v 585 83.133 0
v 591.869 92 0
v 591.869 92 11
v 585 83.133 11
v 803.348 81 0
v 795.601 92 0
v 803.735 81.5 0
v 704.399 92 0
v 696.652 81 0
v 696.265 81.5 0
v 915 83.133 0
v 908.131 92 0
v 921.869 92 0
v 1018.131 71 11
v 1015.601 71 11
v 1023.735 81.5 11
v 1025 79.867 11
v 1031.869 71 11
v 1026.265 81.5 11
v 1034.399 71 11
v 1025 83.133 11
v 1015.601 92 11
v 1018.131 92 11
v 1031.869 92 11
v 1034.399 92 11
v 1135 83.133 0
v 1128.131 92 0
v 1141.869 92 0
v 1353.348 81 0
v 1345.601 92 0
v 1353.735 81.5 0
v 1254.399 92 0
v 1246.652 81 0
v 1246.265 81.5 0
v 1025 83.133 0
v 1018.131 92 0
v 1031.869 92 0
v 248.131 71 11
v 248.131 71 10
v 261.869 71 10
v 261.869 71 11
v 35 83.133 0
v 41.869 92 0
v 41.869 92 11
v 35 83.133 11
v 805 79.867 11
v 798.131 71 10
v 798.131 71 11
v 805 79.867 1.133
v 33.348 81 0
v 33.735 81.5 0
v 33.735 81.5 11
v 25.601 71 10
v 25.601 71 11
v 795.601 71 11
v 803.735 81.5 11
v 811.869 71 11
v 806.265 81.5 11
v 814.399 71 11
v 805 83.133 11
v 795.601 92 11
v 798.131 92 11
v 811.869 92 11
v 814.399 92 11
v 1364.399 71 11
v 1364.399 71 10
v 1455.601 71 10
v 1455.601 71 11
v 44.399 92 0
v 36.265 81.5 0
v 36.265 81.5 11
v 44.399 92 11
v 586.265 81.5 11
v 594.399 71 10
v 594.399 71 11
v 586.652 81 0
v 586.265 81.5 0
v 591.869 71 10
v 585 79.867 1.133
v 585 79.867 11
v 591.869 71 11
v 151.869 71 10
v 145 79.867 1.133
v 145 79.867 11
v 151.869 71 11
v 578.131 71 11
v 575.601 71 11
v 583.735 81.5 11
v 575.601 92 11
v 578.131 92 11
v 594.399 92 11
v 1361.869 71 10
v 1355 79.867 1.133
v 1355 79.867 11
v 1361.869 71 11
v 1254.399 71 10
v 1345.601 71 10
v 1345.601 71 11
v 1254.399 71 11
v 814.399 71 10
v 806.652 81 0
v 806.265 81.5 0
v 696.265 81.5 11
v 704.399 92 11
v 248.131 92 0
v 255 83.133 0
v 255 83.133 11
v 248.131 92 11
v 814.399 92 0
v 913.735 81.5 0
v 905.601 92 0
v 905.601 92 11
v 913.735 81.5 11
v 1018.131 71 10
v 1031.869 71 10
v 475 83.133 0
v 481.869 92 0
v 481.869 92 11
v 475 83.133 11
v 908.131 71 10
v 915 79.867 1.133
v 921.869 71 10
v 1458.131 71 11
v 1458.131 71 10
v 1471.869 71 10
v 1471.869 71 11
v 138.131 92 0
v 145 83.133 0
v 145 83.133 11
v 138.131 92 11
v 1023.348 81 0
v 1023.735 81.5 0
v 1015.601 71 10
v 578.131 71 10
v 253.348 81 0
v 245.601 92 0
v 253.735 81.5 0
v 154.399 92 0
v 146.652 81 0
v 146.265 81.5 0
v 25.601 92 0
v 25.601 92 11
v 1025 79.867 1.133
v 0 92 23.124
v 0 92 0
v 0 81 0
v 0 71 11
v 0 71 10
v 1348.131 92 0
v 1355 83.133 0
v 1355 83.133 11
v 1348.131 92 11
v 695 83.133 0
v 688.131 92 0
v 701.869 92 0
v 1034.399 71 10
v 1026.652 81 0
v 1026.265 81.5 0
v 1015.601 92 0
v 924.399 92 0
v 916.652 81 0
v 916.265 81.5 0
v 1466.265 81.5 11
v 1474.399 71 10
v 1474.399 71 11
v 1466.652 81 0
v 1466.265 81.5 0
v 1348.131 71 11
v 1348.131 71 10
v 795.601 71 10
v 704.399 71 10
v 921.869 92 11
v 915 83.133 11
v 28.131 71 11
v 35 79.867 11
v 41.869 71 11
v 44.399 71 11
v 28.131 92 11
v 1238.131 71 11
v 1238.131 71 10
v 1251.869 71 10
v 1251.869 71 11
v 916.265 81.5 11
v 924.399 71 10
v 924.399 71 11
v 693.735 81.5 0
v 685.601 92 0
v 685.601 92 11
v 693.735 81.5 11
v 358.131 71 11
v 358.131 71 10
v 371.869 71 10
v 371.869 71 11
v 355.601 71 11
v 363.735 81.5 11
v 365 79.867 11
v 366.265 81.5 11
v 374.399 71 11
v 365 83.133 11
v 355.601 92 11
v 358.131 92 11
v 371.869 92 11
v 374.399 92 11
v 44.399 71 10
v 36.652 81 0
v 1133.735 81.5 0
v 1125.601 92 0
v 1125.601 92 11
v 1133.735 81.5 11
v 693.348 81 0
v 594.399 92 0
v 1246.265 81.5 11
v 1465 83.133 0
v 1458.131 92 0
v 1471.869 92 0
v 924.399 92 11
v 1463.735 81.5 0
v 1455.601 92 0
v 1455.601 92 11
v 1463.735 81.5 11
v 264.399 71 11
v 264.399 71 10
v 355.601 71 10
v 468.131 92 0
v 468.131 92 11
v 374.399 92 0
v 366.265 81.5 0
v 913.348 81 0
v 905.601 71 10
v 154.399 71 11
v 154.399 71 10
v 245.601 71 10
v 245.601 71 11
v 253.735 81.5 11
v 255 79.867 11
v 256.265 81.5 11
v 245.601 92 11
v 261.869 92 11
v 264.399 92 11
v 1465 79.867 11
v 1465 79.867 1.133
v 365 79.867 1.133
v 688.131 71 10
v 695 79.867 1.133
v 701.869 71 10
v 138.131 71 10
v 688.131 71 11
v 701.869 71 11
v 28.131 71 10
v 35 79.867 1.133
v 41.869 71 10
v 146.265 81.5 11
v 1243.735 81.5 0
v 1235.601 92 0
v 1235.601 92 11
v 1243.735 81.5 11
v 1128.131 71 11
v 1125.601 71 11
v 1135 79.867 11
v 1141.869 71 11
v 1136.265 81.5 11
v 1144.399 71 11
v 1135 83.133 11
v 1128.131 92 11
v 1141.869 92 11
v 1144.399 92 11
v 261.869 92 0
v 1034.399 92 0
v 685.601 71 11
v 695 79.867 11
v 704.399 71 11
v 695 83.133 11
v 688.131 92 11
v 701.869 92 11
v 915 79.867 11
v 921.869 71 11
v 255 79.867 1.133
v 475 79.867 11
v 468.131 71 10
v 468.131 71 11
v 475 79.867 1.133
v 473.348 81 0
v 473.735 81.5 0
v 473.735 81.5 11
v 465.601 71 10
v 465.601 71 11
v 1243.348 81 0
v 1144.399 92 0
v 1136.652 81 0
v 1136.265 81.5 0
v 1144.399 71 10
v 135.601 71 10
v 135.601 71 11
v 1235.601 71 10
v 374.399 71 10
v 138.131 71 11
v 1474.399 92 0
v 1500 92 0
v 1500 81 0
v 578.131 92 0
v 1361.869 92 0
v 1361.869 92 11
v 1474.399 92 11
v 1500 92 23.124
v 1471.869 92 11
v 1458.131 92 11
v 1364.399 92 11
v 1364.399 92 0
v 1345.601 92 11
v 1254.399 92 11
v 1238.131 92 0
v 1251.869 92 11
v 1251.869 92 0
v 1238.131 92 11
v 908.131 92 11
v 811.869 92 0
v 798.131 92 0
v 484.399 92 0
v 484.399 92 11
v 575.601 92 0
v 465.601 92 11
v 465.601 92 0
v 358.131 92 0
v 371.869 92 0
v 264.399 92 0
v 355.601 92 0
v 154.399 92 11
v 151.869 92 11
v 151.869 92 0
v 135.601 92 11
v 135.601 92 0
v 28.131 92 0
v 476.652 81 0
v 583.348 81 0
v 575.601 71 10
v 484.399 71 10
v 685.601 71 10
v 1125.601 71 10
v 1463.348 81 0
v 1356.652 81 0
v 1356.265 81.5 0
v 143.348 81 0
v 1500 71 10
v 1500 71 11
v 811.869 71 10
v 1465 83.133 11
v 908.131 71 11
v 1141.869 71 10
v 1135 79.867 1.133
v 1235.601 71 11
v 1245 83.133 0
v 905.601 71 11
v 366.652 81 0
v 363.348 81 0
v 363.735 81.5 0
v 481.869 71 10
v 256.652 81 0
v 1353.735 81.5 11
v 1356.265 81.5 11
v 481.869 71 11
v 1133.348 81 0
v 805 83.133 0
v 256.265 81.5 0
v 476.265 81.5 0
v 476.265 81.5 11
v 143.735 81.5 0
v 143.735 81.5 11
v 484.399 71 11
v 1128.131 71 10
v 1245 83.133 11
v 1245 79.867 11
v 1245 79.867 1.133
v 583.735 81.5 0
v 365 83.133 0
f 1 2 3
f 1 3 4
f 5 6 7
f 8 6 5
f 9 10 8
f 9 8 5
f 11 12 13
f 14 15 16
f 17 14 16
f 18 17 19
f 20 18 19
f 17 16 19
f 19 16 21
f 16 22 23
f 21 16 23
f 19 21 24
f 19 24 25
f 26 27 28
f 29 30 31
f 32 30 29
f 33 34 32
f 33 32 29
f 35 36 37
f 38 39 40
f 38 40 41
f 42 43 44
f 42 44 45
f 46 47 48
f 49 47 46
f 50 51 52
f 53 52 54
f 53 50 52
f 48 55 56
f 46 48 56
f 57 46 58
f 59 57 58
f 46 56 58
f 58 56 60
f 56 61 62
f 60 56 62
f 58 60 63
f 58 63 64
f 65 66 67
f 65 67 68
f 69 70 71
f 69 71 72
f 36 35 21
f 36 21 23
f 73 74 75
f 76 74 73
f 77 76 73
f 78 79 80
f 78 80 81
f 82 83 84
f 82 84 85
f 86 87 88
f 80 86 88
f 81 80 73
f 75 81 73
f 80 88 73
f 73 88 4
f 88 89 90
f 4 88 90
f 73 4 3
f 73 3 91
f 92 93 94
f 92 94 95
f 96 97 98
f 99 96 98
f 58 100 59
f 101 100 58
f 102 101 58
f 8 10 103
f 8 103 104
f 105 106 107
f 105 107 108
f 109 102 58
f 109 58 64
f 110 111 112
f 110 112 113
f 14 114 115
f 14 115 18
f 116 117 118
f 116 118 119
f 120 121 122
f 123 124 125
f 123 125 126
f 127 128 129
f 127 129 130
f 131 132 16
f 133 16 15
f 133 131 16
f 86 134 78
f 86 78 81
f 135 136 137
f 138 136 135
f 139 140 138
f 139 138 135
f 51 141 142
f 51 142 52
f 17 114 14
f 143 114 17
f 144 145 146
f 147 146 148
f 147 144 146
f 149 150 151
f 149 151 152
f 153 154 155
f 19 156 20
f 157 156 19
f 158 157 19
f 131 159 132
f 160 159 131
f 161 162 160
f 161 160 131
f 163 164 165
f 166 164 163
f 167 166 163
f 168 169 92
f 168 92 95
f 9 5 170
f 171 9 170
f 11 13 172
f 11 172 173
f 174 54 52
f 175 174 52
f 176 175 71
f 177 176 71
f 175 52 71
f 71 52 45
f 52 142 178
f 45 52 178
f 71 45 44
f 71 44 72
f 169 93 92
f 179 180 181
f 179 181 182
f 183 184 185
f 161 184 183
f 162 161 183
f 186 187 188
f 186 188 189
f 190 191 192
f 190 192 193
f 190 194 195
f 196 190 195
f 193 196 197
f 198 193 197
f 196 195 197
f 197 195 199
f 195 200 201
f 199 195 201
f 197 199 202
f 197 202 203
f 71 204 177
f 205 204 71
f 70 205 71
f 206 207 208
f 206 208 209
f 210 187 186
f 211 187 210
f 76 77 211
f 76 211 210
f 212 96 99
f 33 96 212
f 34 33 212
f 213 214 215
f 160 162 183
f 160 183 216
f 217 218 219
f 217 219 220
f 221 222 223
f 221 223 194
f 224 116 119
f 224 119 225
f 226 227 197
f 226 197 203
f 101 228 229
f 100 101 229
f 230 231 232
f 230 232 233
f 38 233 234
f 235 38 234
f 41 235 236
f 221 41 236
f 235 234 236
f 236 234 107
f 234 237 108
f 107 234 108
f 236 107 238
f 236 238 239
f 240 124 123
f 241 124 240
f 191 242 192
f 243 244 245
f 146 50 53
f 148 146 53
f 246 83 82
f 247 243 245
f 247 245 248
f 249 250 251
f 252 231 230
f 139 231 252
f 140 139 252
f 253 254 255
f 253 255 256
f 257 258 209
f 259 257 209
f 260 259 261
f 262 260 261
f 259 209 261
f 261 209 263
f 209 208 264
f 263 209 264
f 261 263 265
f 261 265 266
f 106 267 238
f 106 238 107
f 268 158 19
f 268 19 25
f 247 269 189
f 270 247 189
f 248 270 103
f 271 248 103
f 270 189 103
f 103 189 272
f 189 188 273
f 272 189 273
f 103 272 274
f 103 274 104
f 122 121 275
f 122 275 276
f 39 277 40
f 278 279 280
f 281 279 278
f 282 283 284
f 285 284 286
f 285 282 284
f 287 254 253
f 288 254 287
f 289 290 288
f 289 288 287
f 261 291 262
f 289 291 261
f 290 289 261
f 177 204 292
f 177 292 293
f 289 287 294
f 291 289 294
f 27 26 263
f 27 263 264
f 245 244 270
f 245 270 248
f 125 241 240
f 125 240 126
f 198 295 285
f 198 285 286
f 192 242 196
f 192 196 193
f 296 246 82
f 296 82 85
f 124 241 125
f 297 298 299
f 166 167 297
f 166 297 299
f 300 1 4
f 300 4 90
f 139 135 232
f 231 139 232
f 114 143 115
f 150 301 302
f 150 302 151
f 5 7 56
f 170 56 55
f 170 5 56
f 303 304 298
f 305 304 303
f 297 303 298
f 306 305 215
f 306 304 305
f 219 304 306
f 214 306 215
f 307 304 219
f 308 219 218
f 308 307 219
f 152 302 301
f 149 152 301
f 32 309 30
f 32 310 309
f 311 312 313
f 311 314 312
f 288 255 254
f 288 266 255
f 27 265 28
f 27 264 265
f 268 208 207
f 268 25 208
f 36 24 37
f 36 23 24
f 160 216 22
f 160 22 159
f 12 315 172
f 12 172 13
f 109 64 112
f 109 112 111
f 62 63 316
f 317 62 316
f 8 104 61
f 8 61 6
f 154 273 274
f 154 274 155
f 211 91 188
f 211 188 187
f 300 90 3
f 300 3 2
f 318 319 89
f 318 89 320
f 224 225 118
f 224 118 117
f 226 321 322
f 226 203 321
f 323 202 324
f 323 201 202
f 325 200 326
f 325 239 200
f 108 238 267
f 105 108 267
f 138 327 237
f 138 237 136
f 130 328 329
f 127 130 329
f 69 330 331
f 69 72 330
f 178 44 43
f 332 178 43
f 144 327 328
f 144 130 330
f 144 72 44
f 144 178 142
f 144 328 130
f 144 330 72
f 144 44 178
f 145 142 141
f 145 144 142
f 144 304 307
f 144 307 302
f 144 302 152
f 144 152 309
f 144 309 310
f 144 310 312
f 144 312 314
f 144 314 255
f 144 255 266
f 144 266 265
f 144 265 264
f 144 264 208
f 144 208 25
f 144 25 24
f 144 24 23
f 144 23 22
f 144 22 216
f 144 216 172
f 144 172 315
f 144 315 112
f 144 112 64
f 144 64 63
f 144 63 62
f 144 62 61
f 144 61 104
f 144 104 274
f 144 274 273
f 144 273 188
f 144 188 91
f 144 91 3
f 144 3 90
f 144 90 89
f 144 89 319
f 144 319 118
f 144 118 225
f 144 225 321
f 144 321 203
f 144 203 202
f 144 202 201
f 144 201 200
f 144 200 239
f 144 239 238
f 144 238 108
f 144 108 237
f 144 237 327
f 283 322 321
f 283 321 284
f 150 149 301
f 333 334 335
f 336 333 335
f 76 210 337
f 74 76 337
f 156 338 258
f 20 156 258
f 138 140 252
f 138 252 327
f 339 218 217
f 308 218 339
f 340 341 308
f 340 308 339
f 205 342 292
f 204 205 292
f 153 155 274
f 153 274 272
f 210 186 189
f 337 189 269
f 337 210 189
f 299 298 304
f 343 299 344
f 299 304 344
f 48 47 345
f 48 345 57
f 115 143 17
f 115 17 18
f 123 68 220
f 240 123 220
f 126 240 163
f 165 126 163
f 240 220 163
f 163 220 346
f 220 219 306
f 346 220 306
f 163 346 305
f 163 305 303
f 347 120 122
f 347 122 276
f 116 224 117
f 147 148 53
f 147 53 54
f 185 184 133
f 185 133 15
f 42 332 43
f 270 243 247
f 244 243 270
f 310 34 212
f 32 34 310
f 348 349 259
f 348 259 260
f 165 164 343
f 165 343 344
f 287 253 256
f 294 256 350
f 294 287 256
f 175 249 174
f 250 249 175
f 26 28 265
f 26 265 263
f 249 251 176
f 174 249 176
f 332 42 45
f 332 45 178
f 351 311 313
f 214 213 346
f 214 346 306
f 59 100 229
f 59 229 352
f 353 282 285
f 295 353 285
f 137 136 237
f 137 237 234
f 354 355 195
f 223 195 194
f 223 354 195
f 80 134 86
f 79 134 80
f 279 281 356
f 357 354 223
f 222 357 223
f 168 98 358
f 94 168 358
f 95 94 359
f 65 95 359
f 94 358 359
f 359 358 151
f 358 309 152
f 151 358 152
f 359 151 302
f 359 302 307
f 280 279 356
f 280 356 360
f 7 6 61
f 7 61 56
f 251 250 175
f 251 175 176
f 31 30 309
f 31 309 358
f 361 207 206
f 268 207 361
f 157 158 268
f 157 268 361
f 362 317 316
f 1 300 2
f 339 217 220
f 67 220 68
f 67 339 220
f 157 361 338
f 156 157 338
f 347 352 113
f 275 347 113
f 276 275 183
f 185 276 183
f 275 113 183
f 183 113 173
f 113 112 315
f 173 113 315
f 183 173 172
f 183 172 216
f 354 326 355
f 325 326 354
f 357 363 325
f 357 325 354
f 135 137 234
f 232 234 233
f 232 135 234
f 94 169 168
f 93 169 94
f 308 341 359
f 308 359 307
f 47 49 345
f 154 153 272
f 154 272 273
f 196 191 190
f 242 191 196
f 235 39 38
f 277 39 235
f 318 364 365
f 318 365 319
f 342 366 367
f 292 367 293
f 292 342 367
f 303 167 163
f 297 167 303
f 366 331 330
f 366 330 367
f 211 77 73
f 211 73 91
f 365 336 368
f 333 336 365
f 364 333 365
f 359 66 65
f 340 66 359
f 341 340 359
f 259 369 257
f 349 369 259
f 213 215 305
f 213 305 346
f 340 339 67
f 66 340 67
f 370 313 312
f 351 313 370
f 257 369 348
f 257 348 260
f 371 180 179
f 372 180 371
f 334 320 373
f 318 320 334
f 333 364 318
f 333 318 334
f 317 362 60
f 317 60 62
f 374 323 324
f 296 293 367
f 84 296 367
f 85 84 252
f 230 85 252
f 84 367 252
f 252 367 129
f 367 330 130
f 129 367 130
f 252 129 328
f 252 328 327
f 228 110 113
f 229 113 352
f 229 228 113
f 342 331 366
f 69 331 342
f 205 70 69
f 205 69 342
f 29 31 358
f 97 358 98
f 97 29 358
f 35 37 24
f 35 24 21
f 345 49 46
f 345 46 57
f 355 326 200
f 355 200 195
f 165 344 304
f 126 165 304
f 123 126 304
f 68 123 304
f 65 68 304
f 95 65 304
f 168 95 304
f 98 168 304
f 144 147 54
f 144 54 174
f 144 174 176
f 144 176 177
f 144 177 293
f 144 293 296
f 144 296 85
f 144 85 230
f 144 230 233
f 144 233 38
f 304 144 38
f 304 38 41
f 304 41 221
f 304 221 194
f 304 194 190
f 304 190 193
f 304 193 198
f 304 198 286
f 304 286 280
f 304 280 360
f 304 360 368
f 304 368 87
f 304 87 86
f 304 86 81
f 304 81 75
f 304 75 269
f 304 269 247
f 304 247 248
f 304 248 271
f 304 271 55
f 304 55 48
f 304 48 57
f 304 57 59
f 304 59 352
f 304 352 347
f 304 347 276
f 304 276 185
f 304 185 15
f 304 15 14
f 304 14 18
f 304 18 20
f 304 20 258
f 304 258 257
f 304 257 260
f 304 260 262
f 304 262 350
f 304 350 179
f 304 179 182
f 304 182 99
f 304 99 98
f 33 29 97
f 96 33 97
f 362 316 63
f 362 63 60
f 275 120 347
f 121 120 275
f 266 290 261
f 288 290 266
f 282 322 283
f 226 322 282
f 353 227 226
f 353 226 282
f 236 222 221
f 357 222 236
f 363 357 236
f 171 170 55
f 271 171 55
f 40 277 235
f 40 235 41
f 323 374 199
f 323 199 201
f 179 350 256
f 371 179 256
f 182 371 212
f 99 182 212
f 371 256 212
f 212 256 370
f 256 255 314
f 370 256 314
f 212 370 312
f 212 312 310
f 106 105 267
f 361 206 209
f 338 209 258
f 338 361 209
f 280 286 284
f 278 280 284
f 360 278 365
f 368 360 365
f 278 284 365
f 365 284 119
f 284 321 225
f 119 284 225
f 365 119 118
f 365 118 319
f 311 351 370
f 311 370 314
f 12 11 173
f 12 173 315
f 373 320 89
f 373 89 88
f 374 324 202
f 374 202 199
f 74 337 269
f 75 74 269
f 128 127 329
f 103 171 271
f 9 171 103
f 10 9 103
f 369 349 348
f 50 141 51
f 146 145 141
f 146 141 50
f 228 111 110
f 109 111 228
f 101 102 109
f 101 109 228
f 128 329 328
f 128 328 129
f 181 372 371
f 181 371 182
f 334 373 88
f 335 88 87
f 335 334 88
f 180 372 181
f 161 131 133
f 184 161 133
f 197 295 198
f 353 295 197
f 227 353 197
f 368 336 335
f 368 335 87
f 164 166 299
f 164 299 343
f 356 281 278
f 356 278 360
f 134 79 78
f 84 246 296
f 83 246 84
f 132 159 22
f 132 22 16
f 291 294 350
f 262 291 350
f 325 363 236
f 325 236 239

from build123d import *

# Parameters (mm, degrees)
PAD007_DEPTH           = 1500
POCKET004_DEPTH        = 11
LINEARPATTERN001_COUNT = 14
LINEARPATTERN001_PITCH = 110


with BuildPart() as part:
    # Sketch011 → Pad007 (new body)
    with BuildSketch(Plane.YZ):
        Polygon((92, 0), (81, 0), (71, 10), (71, 11), (92, 23.124356), align=None)
    extrude(amount=PAD007_DEPTH)

    # Sketch012 → Pocket004 (cut)
    with BuildSketch(Plane.XY):
        Polygon((6.70945, 46.612398), (8.29055, 45.387602), (35, 79.867074), (88.735058, 10.5), (78.064124, -3.275205), (79.645224, -4.5), (90, 8.867074), (100.354776, -4.5), (101.935876, -3.275205), (91.264942, 10.5), (118.29055, 45.387602), (116.70945, 46.612398), (90, 12.132926), (36.264942, 81.5), (46.935876, 95.275205), (45.354776, 96.5), (35, 83.132926), (24.645224, 96.5), (23.064124, 95.275205), (33.735058, 81.5), align=None)
    pocket004 = extrude(amount=POCKET004_DEPTH, mode=Mode.SUBTRACT)

    # LinearPattern001: Pocket004 ×14
    with Locations(*[(i * LINEARPATTERN001_PITCH, 0, 0) for i in range(1, LINEARPATTERN001_COUNT)]):
        add(pocket004, mode=Mode.SUBTRACT)


solid = part.part
